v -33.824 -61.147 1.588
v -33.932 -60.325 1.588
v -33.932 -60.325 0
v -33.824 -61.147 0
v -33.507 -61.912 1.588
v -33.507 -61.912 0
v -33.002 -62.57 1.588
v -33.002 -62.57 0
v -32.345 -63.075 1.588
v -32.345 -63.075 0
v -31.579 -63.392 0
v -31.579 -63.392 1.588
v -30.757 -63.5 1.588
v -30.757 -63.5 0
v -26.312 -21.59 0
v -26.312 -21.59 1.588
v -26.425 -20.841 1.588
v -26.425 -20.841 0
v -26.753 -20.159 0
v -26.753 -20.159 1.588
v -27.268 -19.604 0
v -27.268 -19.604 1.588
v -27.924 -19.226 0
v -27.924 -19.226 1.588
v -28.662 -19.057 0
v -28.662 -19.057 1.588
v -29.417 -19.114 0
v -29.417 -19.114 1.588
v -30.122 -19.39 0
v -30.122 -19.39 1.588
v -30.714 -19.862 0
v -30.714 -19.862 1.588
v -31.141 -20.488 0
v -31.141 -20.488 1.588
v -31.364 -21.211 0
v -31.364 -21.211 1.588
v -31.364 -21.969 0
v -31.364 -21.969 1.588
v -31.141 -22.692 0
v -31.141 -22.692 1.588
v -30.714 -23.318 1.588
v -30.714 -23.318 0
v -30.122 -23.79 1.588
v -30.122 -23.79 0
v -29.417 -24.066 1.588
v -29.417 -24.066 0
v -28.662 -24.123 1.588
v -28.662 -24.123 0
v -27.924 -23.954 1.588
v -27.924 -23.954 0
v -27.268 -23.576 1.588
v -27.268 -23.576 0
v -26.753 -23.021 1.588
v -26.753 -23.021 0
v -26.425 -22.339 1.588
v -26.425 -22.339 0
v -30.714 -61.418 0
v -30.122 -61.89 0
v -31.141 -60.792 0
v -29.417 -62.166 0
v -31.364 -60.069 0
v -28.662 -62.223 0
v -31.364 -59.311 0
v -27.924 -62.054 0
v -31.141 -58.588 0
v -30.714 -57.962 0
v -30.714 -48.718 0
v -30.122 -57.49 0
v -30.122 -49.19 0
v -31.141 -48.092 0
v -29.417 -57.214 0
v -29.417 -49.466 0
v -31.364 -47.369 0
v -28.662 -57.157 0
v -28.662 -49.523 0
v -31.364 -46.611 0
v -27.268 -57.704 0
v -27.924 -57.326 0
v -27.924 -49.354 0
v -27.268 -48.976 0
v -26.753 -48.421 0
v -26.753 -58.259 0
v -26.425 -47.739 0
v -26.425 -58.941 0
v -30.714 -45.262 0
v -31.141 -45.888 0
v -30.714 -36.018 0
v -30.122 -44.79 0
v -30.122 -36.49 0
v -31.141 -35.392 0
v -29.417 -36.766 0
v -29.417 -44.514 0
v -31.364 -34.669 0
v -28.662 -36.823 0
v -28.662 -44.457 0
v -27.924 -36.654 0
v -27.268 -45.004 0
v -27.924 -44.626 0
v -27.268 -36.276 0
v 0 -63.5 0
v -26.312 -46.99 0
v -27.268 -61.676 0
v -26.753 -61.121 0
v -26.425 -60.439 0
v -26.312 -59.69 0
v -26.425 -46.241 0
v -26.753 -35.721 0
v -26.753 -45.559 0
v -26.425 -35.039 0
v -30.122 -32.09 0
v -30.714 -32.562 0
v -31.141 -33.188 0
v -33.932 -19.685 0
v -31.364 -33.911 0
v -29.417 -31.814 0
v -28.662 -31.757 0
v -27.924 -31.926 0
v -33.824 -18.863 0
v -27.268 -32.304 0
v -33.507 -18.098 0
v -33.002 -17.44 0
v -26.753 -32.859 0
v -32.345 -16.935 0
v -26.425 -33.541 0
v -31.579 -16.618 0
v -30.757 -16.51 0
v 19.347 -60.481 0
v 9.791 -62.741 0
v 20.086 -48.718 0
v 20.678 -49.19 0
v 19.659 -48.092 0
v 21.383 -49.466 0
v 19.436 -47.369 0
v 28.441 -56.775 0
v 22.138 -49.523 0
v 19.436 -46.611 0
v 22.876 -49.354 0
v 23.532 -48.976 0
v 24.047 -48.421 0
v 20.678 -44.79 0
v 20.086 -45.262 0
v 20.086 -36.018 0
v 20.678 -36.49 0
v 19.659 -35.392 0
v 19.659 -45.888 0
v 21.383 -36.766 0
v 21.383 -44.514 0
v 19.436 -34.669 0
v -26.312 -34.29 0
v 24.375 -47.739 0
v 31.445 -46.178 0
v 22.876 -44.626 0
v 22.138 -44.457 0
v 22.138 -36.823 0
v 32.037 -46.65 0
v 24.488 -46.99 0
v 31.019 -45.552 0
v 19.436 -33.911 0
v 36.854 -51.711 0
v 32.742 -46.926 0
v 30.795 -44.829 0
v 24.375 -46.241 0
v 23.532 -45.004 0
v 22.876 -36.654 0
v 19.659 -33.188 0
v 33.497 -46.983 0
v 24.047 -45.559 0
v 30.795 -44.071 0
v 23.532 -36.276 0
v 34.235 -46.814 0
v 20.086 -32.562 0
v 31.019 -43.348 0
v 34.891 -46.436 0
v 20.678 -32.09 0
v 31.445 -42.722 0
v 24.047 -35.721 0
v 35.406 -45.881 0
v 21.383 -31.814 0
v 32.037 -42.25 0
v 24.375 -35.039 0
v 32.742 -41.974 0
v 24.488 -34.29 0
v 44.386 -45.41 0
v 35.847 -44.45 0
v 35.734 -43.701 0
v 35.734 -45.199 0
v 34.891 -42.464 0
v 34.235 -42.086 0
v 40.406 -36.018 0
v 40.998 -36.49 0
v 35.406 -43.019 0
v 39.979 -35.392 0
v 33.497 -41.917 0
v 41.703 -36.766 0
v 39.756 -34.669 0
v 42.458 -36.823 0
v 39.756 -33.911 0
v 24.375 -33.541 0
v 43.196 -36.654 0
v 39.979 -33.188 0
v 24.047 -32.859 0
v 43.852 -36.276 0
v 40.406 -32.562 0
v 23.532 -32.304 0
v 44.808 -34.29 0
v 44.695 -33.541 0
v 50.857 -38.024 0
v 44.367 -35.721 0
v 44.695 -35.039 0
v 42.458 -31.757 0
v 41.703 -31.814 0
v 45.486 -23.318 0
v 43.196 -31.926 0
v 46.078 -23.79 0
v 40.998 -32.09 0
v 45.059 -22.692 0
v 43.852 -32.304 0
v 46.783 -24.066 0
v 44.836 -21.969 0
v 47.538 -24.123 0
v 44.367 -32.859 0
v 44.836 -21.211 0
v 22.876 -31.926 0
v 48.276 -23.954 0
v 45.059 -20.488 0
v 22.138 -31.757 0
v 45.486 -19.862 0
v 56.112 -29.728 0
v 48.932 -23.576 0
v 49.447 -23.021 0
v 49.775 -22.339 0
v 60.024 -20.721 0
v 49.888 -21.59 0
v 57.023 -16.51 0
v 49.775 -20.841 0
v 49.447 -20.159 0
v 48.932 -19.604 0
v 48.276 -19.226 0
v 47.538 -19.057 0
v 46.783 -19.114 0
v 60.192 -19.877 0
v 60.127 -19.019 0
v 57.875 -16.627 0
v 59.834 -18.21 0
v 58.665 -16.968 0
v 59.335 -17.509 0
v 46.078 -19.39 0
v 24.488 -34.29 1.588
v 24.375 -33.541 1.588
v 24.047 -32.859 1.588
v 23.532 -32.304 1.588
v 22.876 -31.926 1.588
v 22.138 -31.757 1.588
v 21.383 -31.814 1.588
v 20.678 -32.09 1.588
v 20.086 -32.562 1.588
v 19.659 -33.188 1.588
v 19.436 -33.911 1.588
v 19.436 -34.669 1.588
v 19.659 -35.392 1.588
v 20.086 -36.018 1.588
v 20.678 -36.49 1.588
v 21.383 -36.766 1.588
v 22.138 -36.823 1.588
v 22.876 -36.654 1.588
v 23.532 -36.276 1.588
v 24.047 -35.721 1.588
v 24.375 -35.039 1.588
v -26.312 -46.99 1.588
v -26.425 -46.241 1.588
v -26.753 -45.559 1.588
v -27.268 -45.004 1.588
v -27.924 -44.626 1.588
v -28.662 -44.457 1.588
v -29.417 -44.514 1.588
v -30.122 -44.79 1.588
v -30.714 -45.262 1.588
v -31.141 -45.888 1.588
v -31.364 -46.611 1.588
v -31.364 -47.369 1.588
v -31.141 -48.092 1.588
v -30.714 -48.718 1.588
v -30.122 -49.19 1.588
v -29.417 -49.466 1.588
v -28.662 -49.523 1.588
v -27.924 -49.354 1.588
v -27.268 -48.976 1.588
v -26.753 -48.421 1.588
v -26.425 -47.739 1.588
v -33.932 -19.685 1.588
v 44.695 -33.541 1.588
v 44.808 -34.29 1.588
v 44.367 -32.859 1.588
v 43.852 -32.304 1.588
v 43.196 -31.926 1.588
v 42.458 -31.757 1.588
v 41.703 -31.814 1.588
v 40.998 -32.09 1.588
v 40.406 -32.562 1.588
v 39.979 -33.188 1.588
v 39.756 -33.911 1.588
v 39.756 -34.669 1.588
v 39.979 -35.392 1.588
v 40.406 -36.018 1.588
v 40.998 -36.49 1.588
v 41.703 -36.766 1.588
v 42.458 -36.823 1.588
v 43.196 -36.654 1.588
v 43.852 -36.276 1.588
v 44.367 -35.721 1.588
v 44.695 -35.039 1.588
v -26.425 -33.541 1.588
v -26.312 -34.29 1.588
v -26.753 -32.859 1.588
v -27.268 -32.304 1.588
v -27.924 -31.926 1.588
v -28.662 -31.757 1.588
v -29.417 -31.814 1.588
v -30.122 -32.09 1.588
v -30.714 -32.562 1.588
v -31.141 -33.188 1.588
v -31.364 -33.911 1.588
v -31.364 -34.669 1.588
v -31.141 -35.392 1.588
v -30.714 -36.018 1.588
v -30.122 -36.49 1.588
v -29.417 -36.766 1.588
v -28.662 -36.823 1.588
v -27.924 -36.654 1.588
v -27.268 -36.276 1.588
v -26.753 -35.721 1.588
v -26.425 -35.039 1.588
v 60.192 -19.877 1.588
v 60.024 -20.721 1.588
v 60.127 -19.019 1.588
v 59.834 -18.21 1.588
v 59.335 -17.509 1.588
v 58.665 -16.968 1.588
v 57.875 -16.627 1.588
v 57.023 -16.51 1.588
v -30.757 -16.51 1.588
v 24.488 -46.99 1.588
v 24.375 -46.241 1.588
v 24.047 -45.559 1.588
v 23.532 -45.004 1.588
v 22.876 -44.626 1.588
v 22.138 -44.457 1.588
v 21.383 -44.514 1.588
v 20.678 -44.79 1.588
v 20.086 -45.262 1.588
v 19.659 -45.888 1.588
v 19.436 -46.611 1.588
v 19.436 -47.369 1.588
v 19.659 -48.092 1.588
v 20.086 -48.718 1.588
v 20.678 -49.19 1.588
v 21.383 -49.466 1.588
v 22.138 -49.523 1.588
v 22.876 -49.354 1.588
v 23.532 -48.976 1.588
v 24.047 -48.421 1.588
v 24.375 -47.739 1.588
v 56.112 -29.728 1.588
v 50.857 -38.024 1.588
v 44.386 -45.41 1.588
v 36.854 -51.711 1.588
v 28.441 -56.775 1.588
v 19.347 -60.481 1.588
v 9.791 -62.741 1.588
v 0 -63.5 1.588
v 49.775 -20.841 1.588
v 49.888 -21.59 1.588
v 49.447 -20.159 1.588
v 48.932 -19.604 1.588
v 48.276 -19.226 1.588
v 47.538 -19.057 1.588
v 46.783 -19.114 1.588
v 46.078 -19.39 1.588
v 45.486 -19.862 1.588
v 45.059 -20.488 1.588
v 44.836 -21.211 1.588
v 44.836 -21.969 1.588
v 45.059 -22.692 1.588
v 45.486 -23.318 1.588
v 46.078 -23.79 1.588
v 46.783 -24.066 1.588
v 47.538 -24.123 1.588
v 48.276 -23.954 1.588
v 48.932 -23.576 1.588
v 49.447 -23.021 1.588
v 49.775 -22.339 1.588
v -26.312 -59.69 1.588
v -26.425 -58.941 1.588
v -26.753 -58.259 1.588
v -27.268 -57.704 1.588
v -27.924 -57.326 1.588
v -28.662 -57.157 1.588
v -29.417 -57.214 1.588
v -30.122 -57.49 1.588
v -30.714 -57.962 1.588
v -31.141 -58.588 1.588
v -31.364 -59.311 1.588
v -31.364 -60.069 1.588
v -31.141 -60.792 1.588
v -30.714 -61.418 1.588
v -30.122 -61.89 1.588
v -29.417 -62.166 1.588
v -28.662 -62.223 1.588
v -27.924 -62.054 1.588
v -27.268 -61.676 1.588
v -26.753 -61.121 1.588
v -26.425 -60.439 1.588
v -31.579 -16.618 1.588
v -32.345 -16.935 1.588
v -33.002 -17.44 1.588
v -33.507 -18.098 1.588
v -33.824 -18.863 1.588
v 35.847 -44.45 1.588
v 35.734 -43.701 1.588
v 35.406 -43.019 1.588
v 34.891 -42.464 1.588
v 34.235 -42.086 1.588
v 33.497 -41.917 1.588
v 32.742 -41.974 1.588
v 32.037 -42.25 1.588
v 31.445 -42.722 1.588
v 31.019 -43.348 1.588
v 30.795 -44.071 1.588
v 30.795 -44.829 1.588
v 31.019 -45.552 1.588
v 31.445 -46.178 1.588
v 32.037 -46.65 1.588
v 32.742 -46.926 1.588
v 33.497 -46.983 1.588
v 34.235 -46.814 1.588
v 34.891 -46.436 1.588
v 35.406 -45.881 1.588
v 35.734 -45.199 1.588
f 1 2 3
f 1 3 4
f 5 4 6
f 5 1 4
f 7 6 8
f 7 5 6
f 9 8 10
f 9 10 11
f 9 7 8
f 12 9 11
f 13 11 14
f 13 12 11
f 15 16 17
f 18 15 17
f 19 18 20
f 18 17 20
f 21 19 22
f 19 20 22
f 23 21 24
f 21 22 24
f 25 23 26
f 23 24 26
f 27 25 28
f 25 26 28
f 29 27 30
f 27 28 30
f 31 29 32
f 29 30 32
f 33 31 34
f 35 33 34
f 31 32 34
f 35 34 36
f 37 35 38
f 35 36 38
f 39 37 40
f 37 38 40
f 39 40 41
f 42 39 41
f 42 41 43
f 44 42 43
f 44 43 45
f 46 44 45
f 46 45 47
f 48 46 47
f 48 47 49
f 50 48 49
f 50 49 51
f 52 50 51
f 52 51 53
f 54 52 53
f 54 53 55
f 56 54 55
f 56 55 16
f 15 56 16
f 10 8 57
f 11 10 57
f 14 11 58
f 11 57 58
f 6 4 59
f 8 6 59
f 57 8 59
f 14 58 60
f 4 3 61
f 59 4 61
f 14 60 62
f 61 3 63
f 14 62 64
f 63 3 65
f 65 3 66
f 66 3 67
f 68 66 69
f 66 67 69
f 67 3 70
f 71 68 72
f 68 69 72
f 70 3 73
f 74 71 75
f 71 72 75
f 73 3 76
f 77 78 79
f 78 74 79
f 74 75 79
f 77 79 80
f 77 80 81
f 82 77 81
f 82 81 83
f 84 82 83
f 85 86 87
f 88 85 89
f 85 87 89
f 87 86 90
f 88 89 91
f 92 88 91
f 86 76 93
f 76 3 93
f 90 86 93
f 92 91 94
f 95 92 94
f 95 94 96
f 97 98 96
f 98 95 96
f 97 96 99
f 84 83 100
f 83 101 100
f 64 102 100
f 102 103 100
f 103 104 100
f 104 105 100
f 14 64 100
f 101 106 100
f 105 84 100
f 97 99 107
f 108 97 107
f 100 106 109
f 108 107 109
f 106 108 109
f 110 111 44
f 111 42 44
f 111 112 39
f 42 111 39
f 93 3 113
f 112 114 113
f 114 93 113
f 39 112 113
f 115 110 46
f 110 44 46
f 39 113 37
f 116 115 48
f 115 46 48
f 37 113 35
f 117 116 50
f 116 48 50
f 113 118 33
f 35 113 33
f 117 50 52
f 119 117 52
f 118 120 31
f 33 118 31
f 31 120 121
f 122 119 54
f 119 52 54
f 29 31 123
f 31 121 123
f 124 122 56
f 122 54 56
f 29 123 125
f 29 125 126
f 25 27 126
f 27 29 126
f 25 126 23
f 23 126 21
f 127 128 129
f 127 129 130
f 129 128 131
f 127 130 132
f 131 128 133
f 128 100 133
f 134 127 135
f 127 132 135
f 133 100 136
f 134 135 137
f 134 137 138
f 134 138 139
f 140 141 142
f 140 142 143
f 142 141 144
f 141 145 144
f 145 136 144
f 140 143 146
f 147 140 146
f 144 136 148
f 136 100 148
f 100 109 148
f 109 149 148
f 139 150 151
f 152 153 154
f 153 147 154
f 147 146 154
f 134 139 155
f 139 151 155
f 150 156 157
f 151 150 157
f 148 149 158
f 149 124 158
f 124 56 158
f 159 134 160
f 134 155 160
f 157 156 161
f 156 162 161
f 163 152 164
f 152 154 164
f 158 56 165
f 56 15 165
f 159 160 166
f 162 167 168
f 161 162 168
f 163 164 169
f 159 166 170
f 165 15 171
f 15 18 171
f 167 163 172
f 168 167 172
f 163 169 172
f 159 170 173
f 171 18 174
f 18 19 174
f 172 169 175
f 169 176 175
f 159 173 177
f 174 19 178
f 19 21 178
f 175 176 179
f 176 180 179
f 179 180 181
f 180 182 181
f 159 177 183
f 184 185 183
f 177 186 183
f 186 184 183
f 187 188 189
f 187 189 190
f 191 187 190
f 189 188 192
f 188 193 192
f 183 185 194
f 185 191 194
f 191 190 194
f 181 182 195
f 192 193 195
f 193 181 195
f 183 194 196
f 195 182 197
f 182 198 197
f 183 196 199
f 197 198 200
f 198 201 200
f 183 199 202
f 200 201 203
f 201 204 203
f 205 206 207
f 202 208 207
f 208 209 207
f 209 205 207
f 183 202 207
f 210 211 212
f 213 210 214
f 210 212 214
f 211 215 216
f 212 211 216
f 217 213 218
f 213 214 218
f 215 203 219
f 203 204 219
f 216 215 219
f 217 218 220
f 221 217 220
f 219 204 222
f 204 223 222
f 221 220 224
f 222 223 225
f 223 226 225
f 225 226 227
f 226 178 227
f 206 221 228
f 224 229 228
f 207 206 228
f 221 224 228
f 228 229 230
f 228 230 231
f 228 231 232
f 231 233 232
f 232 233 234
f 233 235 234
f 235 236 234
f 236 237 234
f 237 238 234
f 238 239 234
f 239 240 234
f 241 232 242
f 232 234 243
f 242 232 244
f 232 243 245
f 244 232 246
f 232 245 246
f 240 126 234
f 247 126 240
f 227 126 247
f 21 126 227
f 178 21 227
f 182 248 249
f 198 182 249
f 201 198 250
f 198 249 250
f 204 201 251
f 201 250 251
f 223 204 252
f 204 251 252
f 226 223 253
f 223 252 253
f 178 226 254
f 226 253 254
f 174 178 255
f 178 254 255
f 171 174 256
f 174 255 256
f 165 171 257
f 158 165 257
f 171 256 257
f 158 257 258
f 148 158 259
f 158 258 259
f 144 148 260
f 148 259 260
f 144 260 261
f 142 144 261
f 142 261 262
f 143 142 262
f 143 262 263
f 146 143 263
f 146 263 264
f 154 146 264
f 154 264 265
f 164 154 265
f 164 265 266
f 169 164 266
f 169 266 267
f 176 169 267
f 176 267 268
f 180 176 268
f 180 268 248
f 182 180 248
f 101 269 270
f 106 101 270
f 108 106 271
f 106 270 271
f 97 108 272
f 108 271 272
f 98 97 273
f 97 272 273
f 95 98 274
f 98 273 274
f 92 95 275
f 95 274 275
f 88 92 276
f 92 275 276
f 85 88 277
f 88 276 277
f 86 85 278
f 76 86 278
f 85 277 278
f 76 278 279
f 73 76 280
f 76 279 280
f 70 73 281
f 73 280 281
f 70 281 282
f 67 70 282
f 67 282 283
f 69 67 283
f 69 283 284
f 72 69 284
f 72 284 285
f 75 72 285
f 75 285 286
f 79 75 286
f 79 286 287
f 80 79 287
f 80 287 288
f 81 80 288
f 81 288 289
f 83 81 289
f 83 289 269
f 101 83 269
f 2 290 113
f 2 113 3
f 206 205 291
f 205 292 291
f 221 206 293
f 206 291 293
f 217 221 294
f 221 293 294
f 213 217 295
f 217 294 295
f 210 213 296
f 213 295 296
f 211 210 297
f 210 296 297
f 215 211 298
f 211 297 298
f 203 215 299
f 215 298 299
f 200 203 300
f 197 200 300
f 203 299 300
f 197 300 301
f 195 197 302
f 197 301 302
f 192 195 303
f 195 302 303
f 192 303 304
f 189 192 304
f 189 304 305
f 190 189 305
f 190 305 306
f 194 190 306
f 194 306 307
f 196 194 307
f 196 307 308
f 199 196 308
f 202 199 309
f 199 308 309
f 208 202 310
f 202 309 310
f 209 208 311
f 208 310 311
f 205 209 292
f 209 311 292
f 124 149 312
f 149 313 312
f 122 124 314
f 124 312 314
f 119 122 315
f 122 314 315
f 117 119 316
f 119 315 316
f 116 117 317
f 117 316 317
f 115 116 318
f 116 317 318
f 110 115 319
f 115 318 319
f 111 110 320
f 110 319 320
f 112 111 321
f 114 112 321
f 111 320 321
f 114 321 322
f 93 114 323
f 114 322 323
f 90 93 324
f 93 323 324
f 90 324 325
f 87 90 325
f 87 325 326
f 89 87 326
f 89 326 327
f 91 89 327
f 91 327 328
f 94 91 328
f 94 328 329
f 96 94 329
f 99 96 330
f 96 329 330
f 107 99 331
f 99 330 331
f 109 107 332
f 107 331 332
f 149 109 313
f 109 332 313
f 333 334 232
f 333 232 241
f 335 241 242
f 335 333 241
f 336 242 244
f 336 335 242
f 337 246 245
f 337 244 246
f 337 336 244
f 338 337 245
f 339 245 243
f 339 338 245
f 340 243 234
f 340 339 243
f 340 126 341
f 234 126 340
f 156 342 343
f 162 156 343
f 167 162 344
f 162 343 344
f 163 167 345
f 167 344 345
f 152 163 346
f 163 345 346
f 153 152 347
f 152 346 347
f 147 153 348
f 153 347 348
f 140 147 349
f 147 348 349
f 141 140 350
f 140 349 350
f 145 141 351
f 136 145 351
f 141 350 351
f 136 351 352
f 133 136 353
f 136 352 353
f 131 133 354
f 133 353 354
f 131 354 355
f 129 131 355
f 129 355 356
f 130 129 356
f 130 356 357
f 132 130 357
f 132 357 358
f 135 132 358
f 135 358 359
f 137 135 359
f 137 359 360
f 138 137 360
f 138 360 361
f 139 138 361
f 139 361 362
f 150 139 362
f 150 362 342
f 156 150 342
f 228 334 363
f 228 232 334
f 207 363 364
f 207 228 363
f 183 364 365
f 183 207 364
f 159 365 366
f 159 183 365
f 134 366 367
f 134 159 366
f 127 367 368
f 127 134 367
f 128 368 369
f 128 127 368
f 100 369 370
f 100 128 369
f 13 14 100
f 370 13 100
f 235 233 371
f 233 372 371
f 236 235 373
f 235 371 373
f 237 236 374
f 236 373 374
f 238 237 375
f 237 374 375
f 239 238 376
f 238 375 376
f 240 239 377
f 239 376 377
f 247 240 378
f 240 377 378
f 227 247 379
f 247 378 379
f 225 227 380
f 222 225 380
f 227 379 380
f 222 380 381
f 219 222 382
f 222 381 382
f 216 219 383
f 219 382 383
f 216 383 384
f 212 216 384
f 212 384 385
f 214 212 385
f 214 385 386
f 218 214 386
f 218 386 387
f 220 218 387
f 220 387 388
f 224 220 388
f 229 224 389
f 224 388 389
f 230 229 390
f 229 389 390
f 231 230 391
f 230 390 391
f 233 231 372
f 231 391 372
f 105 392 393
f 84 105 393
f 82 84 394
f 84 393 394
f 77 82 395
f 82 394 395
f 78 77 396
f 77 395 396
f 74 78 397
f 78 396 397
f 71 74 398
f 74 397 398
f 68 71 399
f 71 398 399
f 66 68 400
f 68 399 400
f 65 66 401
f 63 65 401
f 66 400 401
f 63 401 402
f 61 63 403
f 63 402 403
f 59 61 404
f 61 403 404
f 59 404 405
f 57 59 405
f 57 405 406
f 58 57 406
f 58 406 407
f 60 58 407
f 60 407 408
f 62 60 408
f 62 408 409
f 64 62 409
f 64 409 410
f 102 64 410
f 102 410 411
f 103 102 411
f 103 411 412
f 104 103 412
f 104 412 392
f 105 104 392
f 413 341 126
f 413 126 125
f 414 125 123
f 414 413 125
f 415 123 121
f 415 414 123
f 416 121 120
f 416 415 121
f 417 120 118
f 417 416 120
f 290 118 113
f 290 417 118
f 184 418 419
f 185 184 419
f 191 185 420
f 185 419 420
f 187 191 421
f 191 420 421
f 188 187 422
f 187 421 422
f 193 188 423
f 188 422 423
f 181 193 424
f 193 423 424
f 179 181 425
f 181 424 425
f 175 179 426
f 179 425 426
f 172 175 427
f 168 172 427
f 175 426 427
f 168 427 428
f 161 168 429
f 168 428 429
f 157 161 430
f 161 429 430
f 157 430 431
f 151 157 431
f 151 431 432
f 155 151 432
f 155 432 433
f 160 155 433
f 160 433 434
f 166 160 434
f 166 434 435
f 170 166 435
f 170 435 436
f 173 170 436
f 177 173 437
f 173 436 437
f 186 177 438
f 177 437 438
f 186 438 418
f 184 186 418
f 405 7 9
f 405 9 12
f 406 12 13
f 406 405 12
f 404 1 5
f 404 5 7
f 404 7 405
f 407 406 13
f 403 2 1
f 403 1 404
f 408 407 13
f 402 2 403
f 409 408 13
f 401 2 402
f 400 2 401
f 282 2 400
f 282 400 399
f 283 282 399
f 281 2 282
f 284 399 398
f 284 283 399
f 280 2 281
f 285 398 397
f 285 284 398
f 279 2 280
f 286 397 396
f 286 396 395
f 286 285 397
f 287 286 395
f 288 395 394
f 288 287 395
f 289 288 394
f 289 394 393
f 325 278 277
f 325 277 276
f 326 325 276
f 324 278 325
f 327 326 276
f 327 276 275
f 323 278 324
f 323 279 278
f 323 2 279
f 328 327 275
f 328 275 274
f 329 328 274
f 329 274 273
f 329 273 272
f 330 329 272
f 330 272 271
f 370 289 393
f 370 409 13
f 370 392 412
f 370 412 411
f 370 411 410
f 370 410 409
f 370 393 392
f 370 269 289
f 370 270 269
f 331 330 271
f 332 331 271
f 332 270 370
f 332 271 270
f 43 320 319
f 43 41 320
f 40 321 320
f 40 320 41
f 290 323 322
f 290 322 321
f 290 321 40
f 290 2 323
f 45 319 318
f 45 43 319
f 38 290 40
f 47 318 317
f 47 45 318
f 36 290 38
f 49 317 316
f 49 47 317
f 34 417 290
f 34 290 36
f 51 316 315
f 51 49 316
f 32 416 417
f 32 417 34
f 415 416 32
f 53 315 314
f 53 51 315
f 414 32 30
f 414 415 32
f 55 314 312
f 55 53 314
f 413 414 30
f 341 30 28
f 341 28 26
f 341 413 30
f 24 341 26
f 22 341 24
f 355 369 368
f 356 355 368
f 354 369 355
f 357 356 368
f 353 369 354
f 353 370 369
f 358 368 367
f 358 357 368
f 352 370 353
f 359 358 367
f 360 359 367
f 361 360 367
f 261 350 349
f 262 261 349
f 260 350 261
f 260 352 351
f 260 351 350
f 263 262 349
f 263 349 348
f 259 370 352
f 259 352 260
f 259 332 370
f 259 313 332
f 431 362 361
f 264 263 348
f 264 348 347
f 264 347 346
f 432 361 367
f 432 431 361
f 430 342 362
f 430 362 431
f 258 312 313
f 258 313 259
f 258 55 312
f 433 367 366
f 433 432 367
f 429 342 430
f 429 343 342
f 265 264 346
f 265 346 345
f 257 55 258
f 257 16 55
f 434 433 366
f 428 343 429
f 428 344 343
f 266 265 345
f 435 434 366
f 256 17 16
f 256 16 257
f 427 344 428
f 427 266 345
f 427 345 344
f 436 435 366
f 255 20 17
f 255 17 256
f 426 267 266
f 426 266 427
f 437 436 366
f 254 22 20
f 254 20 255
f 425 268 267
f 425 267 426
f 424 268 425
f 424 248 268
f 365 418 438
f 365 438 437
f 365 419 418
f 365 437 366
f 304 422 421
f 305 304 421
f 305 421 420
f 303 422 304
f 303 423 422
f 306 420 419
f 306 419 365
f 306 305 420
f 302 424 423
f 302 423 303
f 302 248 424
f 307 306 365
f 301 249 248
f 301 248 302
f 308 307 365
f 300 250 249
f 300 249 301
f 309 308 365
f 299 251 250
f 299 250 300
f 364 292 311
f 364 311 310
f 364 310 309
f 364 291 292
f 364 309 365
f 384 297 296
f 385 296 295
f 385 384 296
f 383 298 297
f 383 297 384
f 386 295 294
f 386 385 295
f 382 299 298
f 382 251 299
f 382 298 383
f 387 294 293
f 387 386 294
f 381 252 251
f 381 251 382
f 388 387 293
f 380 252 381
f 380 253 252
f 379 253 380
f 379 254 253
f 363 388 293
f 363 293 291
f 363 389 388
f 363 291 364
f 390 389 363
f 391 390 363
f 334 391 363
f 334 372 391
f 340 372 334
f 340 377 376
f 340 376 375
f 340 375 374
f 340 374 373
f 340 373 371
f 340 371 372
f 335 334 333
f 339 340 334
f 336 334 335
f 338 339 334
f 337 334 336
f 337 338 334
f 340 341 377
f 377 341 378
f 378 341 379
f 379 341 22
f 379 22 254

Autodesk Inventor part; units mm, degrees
ref_plane "YZ Plane" through (0, 0, 0) normal (1, 0, 0) x (0, 1, 0)
ref_plane "XZ Plane" through (0, 0, 0) normal (0, 1, 0) x (-1, 0, 0)
ref_plane "XY Plane" through (0, 0, 0) normal (0, 0, 1) x (1, 0, 0)
sketch "Sketch1" plane through (0, 0, 0) normal (0, 0, 1) x (1, 0, 0)
  circle A0 centre (0, 0) radius 63.5
  line L0 (0, 0) -> (63.5, 0)
  line L1 (0, 0) -> (0, -63.5)
  line L2 (0, 0) -> (-127, 0)
  line L3 (-127, 0) -> (-127, -63.5)
  line L4 (-127, -63.5) -> (0, -63.5)
  line L5 (-127, 0) -> (-127, -16.51)
  line L6 (-127, -16.51) -> (61.3161, -16.51)
  dimension "d0" = 127
  dimension "d1" = 127
  dimension "d43" = 16.51
extrude "Extrusion4" add sketch "Sketch1" along normal blind 1.5875 contours L1 L6 A0 | L4 L3 L6 A0 | A0 L6 L1
sketch "Sketch4" plane through (0, 0, 1.5875) normal (0, 0, 1) x (1, 0, 0)
  arc A0 (0, -63.5) -> (61.3161, -16.51) centre (0, 0) ccw projected
  line L0 (61.3161, -16.51) -> (-59.3339, -16.51)
  line L1 (61.3161, -16.51) -> (-127, -16.51) projected
  line L2 (-59.3339, -16.51) -> (-59.3339, -62.6422)
  line L3 (-59.3339, -62.6422) -> (-59.3339, -63.5)
  line L4 (-127, -63.5) -> (0, -63.5) projected
  line L5 (-136.3806, -11.9346) -> (-59.3339, -11.9346)
  line L6 (-59.3339, -11.9346) -> (-59.3339, -68.0966)
  line L7 (-59.3339, -68.0966) -> (-136.3806, -68.0966)
  line L8 (-136.3806, -68.0966) -> (-136.3806, -11.9346)
  point P0 (-59.3339, -16.51)
  dimension "d46" = 120.65
extrude "Extrusion5" cut sketch "Sketch4" against normal blind 1.5875 contours L6 L7 L8 L5 L2 L3
fillet "Fillet2" radius 3.175 1 edges at (61.3161, -16.51, 0.7937)
fillet "Fillet3" radius 3.175 1 edges at (-59.3339, -16.51, 0.7937)
sketch "Sketch5" plane through (0, 0, 1.5875) normal (0, 0, 1) x (1, 0, 0)
  circle A0 centre (-55.6881, -20.1151) radius 2.54
  line L0 (-55.6881, -20.1151) -> (-55.6881, -45.5151)
  line L1 (-55.6881, -45.5151) -> (-55.6881, -58.2151)
  circle A1 centre (-55.6881, -58.2151) radius 2.54
  line L2 (-55.6881, -20.1151) -> (-30.2881, -20.1151)
  line L3 (-55.6881, -58.2151) -> (-30.2881, -58.2151)
  circle A2 centre (-55.6881, -45.5151) radius 2.54
  circle A3 centre (-55.6881, -32.8151) radius 2.54
  line L4 (-59.3339, -13.3218) -> (-33.9321, -13.3218)
  line L5 (-33.9321, -13.3218) -> (-33.9321, -67.3178)
  line L6 (-33.9321, -67.3178) -> (-59.3339, -67.3178)
  line L7 (-59.3339, -67.3178) -> (-59.3339, -13.3218)
  point P0 (0, 0)
  point P1 (-4.8881, -58.2151)
  point P2 (7.8119, -58.2151)
  point P3 (-59.3339, -20.1151)
  point P4 (-42.9881, -20.1151)
  point P5 (-42.9881, -58.2151)
  dimension "d51" = 5.08
  dimension "d52" = 25.4
  dimension "d53" = 12.7
  dimension "d54" = 5.08
  dimension "d55" = 25.4
  dimension "d63" = 25.4
  dimension "d68" = 5.08
  dimension "d69" = 5.08
extrude "Extrusion6" cut sketch "Sketch5" against normal blind 1.5875
sketch "Sketch6" plane through (0, 0, 1.5875) normal (0, 0, 1) x (1, 0, 0)
  line L0 (57.0229, -16.51) -> (-33.9321, -16.51) projected
  line L1 (-33.9321, -63.5) -> (-33.9321, -16.51) projected
  line L2 (-33.9321, -21.59) -> (-33.9321, -26.67)
  line L3 (-33.9321, -21.59) -> (-28.8521, -21.59)
  line L4 (-28.8521, -21.59) -> (-28.8521, -16.51)
  circle A0 centre (-28.8521, -21.59) radius 2.54
  line L5 (-28.8521, -21.59) -> (-28.8521, -46.99)
  line L6 (-28.8521, -46.99) -> (-28.8521, -59.69)
  circle A1 centre (-28.8521, -59.69) radius 2.54
  line L7 (-28.8521, -21.59) -> (-3.4521, -21.59)
  line L8 (-3.4521, -21.59) -> (21.9479, -21.59)
  line L9 (21.9479, -21.59) -> (47.3479, -21.59)
  circle A2 centre (-28.8521, -34.29) radius 2.54
  circle A3 centre (-28.8521, -46.99) radius 2.54
  line L10 (-28.8521, -59.69) -> (-3.4521, -59.69)
  line L11 (-3.4521, -59.69) -> (9.2479, -59.69)
  circle A4 centre (47.3479, -21.59) radius 2.54
  line L12 (21.9479, -34.29) -> (21.9479, -46.99)
  circle A5 centre (21.9479, -34.29) radius 2.54
  circle A6 centre (21.9479, -46.99) radius 2.54
  line L13 (21.9479, -34.29) -> (42.2679, -34.29)
  circle A7 centre (42.2679, -34.29) radius 2.54
  line L14 (21.9479, -34.29) -> (33.3071, -44.45)
  circle A8 centre (33.3071, -44.45) radius 2.54
  point P0 (0, 0)
  dimension "d80" = 5.08
  dimension "d81" = 5.08
  dimension "d82" = 5.08
  dimension "d83" = 25.4
  dimension "d84" = 12.7
  dimension "d85" = 5.08
  dimension "d86" = 25.4
  dimension "d87" = 25.4
  dimension "d88" = 25.4
  dimension "d89" = 5.08
  dimension "d90" = 5.08
  dimension "d91" = 25.4
  dimension "d92" = 12.7
  dimension "d96" = 5.08
  dimension "d99" = 5.08
  dimension "d100" = 5.08
  dimension "d101" = 5.08
  dimension "d102" = 20.32
  dimension "d103" = 15.24
  dimension "d104" = 5.08
extrude "Extrusion7" cut sketch "Sketch6" against normal blind 5.08 contours A4 | A1 L10 L6 | L6 L10 A1 | A3 L6 L5 | L5 L6 A3 | A2 L5 | L5 A2 | A0 L7 L4 | L4 L3 A0 | L5 A0 L3 | L7 A0 L5 | L14 A5 L12 | L12 A5 L13 | L13 A5 L14 | A6 | A7 | A8
fillet "Fillet4" radius 3.175 2 edges at (-33.9321, -16.51, 0.7937) (-33.9321, -63.5, 0.7937)
equation "\"d97\" = d93"
equation "\"d93\" = 5.08"
properties part number "Sleds"
